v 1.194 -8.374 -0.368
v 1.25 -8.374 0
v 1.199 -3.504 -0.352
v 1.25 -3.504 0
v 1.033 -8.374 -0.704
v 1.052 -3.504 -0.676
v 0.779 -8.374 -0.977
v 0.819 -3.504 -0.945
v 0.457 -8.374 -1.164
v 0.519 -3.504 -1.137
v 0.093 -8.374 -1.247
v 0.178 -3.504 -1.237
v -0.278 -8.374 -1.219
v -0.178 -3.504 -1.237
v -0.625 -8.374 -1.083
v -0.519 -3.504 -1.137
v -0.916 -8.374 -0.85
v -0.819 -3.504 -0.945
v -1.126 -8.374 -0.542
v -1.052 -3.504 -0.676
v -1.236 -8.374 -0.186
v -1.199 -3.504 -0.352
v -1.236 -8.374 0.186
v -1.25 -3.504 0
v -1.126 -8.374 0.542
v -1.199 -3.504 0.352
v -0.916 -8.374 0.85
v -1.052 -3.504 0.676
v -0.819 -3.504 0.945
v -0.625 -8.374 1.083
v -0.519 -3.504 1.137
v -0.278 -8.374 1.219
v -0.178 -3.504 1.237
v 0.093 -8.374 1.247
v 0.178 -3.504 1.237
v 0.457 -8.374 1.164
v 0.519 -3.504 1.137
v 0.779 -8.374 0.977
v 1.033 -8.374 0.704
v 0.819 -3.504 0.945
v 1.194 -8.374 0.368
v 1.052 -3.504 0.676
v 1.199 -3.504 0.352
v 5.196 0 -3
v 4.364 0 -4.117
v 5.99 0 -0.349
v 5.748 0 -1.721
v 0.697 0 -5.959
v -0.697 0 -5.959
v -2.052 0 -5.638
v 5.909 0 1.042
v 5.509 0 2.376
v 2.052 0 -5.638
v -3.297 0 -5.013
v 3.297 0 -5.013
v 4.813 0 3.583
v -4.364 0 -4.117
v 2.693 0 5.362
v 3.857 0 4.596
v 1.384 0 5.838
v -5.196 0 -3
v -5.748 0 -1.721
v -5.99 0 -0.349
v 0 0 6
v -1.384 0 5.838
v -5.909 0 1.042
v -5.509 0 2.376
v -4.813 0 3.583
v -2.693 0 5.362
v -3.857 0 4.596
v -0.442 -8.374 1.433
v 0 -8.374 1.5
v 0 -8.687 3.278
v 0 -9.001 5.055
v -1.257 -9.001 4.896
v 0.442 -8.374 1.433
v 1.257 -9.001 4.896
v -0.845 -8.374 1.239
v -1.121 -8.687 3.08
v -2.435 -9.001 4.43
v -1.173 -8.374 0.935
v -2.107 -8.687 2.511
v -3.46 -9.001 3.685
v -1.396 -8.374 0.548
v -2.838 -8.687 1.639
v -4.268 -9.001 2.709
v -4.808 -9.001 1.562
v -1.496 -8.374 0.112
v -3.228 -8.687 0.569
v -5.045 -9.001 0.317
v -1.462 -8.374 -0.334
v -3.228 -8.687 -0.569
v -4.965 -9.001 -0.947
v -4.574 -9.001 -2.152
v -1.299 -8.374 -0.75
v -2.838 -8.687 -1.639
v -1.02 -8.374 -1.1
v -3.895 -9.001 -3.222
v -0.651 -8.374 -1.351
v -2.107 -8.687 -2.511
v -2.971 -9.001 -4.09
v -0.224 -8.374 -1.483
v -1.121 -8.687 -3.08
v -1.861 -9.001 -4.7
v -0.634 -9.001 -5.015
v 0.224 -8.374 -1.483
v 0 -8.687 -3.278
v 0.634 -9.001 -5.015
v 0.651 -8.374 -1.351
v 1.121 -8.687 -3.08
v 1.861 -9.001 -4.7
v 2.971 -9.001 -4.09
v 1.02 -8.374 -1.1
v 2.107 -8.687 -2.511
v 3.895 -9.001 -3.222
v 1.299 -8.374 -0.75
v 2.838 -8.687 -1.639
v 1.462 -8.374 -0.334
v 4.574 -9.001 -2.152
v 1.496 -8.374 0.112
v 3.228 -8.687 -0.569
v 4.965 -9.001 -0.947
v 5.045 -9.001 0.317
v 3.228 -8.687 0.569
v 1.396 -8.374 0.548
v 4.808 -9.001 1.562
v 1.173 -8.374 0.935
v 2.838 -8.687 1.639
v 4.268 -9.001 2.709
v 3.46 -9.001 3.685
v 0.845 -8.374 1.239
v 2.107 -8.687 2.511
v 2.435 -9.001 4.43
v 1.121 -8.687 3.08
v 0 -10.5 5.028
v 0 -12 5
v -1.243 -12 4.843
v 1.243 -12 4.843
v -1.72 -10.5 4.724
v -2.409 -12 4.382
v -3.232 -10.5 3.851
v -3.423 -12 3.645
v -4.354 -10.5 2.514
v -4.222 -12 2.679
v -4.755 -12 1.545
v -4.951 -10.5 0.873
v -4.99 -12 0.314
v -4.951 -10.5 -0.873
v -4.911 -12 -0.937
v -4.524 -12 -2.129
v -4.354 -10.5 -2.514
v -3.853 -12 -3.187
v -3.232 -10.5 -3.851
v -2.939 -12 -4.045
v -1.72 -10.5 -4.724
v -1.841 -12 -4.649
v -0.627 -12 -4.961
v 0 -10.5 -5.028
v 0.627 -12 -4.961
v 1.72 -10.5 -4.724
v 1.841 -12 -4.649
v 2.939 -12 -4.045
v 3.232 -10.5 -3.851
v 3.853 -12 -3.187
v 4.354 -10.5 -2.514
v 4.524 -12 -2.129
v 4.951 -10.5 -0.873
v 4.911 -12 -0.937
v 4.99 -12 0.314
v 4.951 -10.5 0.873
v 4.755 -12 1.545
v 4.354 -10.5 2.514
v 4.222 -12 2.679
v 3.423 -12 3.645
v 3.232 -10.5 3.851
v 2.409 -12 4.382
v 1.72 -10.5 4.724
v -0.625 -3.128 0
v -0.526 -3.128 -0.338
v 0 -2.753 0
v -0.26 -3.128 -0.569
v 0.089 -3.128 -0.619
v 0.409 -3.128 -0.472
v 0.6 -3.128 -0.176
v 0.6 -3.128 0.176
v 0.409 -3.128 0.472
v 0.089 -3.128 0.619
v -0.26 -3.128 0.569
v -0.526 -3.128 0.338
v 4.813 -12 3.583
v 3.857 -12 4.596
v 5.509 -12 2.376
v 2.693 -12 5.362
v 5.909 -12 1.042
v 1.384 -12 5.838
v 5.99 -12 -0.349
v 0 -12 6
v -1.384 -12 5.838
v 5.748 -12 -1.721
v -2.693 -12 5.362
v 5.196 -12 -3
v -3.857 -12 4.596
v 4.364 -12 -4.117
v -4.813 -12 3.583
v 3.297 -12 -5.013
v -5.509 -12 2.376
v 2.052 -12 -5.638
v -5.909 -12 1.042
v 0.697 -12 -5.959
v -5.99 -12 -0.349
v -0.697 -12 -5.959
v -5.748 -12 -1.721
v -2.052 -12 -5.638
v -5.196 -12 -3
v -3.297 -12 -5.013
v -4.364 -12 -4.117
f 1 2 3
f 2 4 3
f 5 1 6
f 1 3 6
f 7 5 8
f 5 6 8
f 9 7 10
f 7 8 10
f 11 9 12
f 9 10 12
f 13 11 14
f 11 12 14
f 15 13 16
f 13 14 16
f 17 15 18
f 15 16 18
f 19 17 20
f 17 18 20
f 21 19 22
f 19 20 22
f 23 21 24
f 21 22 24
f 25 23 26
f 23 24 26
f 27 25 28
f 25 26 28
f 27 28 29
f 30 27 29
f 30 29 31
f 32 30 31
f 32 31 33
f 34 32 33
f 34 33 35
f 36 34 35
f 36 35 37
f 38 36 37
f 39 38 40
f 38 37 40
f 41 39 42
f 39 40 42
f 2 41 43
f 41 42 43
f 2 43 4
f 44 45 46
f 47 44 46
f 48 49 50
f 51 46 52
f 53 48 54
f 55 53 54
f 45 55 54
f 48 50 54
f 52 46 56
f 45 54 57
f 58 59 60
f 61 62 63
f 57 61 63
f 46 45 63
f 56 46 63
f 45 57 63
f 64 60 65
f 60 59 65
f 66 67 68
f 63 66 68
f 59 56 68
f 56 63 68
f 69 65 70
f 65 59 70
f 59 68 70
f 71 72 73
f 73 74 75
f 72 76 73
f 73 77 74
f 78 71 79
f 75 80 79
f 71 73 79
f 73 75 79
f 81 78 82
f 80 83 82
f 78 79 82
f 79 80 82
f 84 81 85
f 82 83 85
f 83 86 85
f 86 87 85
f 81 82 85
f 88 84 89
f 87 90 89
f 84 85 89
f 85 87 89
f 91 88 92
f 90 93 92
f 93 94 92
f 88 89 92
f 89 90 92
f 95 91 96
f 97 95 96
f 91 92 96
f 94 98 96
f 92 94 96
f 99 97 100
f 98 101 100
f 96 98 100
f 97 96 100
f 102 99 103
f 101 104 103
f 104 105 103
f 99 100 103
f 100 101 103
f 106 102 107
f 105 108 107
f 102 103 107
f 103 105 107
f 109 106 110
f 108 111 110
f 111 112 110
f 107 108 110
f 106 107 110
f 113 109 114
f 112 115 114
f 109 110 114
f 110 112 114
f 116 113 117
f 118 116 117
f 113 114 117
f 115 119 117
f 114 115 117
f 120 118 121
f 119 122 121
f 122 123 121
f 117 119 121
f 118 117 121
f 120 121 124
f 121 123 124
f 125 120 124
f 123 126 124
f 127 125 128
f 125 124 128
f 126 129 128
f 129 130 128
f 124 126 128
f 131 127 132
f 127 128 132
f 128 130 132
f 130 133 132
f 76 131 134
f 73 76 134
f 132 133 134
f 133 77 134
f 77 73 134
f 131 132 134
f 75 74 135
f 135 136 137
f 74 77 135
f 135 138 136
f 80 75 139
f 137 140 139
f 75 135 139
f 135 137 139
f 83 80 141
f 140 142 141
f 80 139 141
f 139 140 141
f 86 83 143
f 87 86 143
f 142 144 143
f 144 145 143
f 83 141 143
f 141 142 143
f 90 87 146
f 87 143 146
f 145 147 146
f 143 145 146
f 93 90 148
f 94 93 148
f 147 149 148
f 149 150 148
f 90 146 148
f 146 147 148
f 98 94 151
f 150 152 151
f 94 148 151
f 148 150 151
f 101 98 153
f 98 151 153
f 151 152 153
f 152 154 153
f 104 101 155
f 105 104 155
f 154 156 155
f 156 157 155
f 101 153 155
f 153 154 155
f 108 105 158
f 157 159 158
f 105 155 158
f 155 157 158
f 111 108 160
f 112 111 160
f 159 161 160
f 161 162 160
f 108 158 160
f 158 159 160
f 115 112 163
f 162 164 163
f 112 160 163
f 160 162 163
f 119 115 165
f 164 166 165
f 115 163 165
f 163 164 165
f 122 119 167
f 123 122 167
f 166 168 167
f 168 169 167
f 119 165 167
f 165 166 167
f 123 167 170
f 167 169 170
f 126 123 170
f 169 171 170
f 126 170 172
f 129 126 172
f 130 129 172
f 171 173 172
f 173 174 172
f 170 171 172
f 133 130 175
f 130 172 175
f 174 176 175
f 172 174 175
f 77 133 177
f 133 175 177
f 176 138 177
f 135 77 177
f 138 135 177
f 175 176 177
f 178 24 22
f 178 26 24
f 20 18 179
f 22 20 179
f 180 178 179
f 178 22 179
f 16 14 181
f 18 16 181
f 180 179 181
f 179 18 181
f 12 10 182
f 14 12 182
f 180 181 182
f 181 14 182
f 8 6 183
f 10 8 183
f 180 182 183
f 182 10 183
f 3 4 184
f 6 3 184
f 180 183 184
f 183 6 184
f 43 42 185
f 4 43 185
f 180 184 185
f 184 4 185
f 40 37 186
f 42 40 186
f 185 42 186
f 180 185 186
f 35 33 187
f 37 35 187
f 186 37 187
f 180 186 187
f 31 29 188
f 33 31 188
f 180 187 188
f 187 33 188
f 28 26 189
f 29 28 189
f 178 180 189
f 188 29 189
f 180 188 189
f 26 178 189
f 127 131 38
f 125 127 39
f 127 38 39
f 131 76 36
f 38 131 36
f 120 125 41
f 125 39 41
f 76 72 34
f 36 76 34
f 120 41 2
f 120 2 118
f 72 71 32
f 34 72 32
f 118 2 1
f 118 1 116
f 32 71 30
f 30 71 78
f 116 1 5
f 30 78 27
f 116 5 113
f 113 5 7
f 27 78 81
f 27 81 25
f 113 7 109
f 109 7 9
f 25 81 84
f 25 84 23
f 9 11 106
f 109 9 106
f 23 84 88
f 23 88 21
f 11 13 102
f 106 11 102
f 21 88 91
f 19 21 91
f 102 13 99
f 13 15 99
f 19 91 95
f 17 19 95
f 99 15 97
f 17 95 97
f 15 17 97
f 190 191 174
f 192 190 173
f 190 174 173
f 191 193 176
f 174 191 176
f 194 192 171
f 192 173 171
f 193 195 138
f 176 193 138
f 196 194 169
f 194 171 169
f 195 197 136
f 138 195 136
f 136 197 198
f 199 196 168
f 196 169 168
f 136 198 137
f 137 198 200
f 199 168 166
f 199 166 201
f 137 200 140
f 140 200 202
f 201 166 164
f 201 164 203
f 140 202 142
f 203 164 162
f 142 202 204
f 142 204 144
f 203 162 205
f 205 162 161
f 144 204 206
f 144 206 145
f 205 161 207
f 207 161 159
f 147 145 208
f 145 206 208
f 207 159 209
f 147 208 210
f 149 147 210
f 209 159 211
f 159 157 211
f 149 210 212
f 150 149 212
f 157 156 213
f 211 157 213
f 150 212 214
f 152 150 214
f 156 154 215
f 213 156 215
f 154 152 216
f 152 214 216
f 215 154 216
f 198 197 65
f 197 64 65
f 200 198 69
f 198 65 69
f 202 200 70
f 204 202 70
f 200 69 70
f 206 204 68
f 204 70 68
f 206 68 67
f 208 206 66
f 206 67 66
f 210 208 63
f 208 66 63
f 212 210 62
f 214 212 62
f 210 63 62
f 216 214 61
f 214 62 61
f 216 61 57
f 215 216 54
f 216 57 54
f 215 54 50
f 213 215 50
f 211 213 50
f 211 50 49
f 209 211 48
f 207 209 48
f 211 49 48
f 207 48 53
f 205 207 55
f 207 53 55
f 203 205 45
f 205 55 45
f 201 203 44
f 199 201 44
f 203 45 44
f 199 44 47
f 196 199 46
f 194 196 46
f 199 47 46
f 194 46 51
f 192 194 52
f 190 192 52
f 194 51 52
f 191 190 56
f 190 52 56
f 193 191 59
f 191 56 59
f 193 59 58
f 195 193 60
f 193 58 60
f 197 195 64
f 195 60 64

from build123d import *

# Parameters (mm, degrees)
M3X0_5_TAPPED_HOLE2_D     = 2.5
M3X0_5_TAPPED_HOLE2_DEPTH = 4.87
M3X0_5_TAPPED_HOLE2_TIP   = 0.751075774


with BuildPart() as part:
    # Sketch2 → Revolve1 (revolve)
    with BuildSketch(Plane(origin=(0, 0, 0), x_dir=(0, 0, -1), z_dir=(1, 0, 0))):
        Polygon((-5, -12), (-6, -12), (-6, 0), (0, 0), (0, -8.373661293), (-1.5, -8.373661293), (-5.055003164, -9.000504267), align=None)
    revolve(axis=Axis((0, 88.13248411, 0), (0, -1, 0)))

    # M3x0.5 Tapped Hole2
    with Locations(Plane(origin=(0, -8.373661293, 0), x_dir=(-1, 0, 0), z_dir=(0, -1, 0))):
        with Locations((0, 0)):
            Hole(M3X0_5_TAPPED_HOLE2_D / 2, depth=M3X0_5_TAPPED_HOLE2_DEPTH)
            with Locations((0, 0, -(M3X0_5_TAPPED_HOLE2_DEPTH + M3X0_5_TAPPED_HOLE2_TIP / 2))):  # 118° drill point
                Cone(0, M3X0_5_TAPPED_HOLE2_D / 2, M3X0_5_TAPPED_HOLE2_TIP, mode=Mode.SUBTRACT)


solid = part.part
